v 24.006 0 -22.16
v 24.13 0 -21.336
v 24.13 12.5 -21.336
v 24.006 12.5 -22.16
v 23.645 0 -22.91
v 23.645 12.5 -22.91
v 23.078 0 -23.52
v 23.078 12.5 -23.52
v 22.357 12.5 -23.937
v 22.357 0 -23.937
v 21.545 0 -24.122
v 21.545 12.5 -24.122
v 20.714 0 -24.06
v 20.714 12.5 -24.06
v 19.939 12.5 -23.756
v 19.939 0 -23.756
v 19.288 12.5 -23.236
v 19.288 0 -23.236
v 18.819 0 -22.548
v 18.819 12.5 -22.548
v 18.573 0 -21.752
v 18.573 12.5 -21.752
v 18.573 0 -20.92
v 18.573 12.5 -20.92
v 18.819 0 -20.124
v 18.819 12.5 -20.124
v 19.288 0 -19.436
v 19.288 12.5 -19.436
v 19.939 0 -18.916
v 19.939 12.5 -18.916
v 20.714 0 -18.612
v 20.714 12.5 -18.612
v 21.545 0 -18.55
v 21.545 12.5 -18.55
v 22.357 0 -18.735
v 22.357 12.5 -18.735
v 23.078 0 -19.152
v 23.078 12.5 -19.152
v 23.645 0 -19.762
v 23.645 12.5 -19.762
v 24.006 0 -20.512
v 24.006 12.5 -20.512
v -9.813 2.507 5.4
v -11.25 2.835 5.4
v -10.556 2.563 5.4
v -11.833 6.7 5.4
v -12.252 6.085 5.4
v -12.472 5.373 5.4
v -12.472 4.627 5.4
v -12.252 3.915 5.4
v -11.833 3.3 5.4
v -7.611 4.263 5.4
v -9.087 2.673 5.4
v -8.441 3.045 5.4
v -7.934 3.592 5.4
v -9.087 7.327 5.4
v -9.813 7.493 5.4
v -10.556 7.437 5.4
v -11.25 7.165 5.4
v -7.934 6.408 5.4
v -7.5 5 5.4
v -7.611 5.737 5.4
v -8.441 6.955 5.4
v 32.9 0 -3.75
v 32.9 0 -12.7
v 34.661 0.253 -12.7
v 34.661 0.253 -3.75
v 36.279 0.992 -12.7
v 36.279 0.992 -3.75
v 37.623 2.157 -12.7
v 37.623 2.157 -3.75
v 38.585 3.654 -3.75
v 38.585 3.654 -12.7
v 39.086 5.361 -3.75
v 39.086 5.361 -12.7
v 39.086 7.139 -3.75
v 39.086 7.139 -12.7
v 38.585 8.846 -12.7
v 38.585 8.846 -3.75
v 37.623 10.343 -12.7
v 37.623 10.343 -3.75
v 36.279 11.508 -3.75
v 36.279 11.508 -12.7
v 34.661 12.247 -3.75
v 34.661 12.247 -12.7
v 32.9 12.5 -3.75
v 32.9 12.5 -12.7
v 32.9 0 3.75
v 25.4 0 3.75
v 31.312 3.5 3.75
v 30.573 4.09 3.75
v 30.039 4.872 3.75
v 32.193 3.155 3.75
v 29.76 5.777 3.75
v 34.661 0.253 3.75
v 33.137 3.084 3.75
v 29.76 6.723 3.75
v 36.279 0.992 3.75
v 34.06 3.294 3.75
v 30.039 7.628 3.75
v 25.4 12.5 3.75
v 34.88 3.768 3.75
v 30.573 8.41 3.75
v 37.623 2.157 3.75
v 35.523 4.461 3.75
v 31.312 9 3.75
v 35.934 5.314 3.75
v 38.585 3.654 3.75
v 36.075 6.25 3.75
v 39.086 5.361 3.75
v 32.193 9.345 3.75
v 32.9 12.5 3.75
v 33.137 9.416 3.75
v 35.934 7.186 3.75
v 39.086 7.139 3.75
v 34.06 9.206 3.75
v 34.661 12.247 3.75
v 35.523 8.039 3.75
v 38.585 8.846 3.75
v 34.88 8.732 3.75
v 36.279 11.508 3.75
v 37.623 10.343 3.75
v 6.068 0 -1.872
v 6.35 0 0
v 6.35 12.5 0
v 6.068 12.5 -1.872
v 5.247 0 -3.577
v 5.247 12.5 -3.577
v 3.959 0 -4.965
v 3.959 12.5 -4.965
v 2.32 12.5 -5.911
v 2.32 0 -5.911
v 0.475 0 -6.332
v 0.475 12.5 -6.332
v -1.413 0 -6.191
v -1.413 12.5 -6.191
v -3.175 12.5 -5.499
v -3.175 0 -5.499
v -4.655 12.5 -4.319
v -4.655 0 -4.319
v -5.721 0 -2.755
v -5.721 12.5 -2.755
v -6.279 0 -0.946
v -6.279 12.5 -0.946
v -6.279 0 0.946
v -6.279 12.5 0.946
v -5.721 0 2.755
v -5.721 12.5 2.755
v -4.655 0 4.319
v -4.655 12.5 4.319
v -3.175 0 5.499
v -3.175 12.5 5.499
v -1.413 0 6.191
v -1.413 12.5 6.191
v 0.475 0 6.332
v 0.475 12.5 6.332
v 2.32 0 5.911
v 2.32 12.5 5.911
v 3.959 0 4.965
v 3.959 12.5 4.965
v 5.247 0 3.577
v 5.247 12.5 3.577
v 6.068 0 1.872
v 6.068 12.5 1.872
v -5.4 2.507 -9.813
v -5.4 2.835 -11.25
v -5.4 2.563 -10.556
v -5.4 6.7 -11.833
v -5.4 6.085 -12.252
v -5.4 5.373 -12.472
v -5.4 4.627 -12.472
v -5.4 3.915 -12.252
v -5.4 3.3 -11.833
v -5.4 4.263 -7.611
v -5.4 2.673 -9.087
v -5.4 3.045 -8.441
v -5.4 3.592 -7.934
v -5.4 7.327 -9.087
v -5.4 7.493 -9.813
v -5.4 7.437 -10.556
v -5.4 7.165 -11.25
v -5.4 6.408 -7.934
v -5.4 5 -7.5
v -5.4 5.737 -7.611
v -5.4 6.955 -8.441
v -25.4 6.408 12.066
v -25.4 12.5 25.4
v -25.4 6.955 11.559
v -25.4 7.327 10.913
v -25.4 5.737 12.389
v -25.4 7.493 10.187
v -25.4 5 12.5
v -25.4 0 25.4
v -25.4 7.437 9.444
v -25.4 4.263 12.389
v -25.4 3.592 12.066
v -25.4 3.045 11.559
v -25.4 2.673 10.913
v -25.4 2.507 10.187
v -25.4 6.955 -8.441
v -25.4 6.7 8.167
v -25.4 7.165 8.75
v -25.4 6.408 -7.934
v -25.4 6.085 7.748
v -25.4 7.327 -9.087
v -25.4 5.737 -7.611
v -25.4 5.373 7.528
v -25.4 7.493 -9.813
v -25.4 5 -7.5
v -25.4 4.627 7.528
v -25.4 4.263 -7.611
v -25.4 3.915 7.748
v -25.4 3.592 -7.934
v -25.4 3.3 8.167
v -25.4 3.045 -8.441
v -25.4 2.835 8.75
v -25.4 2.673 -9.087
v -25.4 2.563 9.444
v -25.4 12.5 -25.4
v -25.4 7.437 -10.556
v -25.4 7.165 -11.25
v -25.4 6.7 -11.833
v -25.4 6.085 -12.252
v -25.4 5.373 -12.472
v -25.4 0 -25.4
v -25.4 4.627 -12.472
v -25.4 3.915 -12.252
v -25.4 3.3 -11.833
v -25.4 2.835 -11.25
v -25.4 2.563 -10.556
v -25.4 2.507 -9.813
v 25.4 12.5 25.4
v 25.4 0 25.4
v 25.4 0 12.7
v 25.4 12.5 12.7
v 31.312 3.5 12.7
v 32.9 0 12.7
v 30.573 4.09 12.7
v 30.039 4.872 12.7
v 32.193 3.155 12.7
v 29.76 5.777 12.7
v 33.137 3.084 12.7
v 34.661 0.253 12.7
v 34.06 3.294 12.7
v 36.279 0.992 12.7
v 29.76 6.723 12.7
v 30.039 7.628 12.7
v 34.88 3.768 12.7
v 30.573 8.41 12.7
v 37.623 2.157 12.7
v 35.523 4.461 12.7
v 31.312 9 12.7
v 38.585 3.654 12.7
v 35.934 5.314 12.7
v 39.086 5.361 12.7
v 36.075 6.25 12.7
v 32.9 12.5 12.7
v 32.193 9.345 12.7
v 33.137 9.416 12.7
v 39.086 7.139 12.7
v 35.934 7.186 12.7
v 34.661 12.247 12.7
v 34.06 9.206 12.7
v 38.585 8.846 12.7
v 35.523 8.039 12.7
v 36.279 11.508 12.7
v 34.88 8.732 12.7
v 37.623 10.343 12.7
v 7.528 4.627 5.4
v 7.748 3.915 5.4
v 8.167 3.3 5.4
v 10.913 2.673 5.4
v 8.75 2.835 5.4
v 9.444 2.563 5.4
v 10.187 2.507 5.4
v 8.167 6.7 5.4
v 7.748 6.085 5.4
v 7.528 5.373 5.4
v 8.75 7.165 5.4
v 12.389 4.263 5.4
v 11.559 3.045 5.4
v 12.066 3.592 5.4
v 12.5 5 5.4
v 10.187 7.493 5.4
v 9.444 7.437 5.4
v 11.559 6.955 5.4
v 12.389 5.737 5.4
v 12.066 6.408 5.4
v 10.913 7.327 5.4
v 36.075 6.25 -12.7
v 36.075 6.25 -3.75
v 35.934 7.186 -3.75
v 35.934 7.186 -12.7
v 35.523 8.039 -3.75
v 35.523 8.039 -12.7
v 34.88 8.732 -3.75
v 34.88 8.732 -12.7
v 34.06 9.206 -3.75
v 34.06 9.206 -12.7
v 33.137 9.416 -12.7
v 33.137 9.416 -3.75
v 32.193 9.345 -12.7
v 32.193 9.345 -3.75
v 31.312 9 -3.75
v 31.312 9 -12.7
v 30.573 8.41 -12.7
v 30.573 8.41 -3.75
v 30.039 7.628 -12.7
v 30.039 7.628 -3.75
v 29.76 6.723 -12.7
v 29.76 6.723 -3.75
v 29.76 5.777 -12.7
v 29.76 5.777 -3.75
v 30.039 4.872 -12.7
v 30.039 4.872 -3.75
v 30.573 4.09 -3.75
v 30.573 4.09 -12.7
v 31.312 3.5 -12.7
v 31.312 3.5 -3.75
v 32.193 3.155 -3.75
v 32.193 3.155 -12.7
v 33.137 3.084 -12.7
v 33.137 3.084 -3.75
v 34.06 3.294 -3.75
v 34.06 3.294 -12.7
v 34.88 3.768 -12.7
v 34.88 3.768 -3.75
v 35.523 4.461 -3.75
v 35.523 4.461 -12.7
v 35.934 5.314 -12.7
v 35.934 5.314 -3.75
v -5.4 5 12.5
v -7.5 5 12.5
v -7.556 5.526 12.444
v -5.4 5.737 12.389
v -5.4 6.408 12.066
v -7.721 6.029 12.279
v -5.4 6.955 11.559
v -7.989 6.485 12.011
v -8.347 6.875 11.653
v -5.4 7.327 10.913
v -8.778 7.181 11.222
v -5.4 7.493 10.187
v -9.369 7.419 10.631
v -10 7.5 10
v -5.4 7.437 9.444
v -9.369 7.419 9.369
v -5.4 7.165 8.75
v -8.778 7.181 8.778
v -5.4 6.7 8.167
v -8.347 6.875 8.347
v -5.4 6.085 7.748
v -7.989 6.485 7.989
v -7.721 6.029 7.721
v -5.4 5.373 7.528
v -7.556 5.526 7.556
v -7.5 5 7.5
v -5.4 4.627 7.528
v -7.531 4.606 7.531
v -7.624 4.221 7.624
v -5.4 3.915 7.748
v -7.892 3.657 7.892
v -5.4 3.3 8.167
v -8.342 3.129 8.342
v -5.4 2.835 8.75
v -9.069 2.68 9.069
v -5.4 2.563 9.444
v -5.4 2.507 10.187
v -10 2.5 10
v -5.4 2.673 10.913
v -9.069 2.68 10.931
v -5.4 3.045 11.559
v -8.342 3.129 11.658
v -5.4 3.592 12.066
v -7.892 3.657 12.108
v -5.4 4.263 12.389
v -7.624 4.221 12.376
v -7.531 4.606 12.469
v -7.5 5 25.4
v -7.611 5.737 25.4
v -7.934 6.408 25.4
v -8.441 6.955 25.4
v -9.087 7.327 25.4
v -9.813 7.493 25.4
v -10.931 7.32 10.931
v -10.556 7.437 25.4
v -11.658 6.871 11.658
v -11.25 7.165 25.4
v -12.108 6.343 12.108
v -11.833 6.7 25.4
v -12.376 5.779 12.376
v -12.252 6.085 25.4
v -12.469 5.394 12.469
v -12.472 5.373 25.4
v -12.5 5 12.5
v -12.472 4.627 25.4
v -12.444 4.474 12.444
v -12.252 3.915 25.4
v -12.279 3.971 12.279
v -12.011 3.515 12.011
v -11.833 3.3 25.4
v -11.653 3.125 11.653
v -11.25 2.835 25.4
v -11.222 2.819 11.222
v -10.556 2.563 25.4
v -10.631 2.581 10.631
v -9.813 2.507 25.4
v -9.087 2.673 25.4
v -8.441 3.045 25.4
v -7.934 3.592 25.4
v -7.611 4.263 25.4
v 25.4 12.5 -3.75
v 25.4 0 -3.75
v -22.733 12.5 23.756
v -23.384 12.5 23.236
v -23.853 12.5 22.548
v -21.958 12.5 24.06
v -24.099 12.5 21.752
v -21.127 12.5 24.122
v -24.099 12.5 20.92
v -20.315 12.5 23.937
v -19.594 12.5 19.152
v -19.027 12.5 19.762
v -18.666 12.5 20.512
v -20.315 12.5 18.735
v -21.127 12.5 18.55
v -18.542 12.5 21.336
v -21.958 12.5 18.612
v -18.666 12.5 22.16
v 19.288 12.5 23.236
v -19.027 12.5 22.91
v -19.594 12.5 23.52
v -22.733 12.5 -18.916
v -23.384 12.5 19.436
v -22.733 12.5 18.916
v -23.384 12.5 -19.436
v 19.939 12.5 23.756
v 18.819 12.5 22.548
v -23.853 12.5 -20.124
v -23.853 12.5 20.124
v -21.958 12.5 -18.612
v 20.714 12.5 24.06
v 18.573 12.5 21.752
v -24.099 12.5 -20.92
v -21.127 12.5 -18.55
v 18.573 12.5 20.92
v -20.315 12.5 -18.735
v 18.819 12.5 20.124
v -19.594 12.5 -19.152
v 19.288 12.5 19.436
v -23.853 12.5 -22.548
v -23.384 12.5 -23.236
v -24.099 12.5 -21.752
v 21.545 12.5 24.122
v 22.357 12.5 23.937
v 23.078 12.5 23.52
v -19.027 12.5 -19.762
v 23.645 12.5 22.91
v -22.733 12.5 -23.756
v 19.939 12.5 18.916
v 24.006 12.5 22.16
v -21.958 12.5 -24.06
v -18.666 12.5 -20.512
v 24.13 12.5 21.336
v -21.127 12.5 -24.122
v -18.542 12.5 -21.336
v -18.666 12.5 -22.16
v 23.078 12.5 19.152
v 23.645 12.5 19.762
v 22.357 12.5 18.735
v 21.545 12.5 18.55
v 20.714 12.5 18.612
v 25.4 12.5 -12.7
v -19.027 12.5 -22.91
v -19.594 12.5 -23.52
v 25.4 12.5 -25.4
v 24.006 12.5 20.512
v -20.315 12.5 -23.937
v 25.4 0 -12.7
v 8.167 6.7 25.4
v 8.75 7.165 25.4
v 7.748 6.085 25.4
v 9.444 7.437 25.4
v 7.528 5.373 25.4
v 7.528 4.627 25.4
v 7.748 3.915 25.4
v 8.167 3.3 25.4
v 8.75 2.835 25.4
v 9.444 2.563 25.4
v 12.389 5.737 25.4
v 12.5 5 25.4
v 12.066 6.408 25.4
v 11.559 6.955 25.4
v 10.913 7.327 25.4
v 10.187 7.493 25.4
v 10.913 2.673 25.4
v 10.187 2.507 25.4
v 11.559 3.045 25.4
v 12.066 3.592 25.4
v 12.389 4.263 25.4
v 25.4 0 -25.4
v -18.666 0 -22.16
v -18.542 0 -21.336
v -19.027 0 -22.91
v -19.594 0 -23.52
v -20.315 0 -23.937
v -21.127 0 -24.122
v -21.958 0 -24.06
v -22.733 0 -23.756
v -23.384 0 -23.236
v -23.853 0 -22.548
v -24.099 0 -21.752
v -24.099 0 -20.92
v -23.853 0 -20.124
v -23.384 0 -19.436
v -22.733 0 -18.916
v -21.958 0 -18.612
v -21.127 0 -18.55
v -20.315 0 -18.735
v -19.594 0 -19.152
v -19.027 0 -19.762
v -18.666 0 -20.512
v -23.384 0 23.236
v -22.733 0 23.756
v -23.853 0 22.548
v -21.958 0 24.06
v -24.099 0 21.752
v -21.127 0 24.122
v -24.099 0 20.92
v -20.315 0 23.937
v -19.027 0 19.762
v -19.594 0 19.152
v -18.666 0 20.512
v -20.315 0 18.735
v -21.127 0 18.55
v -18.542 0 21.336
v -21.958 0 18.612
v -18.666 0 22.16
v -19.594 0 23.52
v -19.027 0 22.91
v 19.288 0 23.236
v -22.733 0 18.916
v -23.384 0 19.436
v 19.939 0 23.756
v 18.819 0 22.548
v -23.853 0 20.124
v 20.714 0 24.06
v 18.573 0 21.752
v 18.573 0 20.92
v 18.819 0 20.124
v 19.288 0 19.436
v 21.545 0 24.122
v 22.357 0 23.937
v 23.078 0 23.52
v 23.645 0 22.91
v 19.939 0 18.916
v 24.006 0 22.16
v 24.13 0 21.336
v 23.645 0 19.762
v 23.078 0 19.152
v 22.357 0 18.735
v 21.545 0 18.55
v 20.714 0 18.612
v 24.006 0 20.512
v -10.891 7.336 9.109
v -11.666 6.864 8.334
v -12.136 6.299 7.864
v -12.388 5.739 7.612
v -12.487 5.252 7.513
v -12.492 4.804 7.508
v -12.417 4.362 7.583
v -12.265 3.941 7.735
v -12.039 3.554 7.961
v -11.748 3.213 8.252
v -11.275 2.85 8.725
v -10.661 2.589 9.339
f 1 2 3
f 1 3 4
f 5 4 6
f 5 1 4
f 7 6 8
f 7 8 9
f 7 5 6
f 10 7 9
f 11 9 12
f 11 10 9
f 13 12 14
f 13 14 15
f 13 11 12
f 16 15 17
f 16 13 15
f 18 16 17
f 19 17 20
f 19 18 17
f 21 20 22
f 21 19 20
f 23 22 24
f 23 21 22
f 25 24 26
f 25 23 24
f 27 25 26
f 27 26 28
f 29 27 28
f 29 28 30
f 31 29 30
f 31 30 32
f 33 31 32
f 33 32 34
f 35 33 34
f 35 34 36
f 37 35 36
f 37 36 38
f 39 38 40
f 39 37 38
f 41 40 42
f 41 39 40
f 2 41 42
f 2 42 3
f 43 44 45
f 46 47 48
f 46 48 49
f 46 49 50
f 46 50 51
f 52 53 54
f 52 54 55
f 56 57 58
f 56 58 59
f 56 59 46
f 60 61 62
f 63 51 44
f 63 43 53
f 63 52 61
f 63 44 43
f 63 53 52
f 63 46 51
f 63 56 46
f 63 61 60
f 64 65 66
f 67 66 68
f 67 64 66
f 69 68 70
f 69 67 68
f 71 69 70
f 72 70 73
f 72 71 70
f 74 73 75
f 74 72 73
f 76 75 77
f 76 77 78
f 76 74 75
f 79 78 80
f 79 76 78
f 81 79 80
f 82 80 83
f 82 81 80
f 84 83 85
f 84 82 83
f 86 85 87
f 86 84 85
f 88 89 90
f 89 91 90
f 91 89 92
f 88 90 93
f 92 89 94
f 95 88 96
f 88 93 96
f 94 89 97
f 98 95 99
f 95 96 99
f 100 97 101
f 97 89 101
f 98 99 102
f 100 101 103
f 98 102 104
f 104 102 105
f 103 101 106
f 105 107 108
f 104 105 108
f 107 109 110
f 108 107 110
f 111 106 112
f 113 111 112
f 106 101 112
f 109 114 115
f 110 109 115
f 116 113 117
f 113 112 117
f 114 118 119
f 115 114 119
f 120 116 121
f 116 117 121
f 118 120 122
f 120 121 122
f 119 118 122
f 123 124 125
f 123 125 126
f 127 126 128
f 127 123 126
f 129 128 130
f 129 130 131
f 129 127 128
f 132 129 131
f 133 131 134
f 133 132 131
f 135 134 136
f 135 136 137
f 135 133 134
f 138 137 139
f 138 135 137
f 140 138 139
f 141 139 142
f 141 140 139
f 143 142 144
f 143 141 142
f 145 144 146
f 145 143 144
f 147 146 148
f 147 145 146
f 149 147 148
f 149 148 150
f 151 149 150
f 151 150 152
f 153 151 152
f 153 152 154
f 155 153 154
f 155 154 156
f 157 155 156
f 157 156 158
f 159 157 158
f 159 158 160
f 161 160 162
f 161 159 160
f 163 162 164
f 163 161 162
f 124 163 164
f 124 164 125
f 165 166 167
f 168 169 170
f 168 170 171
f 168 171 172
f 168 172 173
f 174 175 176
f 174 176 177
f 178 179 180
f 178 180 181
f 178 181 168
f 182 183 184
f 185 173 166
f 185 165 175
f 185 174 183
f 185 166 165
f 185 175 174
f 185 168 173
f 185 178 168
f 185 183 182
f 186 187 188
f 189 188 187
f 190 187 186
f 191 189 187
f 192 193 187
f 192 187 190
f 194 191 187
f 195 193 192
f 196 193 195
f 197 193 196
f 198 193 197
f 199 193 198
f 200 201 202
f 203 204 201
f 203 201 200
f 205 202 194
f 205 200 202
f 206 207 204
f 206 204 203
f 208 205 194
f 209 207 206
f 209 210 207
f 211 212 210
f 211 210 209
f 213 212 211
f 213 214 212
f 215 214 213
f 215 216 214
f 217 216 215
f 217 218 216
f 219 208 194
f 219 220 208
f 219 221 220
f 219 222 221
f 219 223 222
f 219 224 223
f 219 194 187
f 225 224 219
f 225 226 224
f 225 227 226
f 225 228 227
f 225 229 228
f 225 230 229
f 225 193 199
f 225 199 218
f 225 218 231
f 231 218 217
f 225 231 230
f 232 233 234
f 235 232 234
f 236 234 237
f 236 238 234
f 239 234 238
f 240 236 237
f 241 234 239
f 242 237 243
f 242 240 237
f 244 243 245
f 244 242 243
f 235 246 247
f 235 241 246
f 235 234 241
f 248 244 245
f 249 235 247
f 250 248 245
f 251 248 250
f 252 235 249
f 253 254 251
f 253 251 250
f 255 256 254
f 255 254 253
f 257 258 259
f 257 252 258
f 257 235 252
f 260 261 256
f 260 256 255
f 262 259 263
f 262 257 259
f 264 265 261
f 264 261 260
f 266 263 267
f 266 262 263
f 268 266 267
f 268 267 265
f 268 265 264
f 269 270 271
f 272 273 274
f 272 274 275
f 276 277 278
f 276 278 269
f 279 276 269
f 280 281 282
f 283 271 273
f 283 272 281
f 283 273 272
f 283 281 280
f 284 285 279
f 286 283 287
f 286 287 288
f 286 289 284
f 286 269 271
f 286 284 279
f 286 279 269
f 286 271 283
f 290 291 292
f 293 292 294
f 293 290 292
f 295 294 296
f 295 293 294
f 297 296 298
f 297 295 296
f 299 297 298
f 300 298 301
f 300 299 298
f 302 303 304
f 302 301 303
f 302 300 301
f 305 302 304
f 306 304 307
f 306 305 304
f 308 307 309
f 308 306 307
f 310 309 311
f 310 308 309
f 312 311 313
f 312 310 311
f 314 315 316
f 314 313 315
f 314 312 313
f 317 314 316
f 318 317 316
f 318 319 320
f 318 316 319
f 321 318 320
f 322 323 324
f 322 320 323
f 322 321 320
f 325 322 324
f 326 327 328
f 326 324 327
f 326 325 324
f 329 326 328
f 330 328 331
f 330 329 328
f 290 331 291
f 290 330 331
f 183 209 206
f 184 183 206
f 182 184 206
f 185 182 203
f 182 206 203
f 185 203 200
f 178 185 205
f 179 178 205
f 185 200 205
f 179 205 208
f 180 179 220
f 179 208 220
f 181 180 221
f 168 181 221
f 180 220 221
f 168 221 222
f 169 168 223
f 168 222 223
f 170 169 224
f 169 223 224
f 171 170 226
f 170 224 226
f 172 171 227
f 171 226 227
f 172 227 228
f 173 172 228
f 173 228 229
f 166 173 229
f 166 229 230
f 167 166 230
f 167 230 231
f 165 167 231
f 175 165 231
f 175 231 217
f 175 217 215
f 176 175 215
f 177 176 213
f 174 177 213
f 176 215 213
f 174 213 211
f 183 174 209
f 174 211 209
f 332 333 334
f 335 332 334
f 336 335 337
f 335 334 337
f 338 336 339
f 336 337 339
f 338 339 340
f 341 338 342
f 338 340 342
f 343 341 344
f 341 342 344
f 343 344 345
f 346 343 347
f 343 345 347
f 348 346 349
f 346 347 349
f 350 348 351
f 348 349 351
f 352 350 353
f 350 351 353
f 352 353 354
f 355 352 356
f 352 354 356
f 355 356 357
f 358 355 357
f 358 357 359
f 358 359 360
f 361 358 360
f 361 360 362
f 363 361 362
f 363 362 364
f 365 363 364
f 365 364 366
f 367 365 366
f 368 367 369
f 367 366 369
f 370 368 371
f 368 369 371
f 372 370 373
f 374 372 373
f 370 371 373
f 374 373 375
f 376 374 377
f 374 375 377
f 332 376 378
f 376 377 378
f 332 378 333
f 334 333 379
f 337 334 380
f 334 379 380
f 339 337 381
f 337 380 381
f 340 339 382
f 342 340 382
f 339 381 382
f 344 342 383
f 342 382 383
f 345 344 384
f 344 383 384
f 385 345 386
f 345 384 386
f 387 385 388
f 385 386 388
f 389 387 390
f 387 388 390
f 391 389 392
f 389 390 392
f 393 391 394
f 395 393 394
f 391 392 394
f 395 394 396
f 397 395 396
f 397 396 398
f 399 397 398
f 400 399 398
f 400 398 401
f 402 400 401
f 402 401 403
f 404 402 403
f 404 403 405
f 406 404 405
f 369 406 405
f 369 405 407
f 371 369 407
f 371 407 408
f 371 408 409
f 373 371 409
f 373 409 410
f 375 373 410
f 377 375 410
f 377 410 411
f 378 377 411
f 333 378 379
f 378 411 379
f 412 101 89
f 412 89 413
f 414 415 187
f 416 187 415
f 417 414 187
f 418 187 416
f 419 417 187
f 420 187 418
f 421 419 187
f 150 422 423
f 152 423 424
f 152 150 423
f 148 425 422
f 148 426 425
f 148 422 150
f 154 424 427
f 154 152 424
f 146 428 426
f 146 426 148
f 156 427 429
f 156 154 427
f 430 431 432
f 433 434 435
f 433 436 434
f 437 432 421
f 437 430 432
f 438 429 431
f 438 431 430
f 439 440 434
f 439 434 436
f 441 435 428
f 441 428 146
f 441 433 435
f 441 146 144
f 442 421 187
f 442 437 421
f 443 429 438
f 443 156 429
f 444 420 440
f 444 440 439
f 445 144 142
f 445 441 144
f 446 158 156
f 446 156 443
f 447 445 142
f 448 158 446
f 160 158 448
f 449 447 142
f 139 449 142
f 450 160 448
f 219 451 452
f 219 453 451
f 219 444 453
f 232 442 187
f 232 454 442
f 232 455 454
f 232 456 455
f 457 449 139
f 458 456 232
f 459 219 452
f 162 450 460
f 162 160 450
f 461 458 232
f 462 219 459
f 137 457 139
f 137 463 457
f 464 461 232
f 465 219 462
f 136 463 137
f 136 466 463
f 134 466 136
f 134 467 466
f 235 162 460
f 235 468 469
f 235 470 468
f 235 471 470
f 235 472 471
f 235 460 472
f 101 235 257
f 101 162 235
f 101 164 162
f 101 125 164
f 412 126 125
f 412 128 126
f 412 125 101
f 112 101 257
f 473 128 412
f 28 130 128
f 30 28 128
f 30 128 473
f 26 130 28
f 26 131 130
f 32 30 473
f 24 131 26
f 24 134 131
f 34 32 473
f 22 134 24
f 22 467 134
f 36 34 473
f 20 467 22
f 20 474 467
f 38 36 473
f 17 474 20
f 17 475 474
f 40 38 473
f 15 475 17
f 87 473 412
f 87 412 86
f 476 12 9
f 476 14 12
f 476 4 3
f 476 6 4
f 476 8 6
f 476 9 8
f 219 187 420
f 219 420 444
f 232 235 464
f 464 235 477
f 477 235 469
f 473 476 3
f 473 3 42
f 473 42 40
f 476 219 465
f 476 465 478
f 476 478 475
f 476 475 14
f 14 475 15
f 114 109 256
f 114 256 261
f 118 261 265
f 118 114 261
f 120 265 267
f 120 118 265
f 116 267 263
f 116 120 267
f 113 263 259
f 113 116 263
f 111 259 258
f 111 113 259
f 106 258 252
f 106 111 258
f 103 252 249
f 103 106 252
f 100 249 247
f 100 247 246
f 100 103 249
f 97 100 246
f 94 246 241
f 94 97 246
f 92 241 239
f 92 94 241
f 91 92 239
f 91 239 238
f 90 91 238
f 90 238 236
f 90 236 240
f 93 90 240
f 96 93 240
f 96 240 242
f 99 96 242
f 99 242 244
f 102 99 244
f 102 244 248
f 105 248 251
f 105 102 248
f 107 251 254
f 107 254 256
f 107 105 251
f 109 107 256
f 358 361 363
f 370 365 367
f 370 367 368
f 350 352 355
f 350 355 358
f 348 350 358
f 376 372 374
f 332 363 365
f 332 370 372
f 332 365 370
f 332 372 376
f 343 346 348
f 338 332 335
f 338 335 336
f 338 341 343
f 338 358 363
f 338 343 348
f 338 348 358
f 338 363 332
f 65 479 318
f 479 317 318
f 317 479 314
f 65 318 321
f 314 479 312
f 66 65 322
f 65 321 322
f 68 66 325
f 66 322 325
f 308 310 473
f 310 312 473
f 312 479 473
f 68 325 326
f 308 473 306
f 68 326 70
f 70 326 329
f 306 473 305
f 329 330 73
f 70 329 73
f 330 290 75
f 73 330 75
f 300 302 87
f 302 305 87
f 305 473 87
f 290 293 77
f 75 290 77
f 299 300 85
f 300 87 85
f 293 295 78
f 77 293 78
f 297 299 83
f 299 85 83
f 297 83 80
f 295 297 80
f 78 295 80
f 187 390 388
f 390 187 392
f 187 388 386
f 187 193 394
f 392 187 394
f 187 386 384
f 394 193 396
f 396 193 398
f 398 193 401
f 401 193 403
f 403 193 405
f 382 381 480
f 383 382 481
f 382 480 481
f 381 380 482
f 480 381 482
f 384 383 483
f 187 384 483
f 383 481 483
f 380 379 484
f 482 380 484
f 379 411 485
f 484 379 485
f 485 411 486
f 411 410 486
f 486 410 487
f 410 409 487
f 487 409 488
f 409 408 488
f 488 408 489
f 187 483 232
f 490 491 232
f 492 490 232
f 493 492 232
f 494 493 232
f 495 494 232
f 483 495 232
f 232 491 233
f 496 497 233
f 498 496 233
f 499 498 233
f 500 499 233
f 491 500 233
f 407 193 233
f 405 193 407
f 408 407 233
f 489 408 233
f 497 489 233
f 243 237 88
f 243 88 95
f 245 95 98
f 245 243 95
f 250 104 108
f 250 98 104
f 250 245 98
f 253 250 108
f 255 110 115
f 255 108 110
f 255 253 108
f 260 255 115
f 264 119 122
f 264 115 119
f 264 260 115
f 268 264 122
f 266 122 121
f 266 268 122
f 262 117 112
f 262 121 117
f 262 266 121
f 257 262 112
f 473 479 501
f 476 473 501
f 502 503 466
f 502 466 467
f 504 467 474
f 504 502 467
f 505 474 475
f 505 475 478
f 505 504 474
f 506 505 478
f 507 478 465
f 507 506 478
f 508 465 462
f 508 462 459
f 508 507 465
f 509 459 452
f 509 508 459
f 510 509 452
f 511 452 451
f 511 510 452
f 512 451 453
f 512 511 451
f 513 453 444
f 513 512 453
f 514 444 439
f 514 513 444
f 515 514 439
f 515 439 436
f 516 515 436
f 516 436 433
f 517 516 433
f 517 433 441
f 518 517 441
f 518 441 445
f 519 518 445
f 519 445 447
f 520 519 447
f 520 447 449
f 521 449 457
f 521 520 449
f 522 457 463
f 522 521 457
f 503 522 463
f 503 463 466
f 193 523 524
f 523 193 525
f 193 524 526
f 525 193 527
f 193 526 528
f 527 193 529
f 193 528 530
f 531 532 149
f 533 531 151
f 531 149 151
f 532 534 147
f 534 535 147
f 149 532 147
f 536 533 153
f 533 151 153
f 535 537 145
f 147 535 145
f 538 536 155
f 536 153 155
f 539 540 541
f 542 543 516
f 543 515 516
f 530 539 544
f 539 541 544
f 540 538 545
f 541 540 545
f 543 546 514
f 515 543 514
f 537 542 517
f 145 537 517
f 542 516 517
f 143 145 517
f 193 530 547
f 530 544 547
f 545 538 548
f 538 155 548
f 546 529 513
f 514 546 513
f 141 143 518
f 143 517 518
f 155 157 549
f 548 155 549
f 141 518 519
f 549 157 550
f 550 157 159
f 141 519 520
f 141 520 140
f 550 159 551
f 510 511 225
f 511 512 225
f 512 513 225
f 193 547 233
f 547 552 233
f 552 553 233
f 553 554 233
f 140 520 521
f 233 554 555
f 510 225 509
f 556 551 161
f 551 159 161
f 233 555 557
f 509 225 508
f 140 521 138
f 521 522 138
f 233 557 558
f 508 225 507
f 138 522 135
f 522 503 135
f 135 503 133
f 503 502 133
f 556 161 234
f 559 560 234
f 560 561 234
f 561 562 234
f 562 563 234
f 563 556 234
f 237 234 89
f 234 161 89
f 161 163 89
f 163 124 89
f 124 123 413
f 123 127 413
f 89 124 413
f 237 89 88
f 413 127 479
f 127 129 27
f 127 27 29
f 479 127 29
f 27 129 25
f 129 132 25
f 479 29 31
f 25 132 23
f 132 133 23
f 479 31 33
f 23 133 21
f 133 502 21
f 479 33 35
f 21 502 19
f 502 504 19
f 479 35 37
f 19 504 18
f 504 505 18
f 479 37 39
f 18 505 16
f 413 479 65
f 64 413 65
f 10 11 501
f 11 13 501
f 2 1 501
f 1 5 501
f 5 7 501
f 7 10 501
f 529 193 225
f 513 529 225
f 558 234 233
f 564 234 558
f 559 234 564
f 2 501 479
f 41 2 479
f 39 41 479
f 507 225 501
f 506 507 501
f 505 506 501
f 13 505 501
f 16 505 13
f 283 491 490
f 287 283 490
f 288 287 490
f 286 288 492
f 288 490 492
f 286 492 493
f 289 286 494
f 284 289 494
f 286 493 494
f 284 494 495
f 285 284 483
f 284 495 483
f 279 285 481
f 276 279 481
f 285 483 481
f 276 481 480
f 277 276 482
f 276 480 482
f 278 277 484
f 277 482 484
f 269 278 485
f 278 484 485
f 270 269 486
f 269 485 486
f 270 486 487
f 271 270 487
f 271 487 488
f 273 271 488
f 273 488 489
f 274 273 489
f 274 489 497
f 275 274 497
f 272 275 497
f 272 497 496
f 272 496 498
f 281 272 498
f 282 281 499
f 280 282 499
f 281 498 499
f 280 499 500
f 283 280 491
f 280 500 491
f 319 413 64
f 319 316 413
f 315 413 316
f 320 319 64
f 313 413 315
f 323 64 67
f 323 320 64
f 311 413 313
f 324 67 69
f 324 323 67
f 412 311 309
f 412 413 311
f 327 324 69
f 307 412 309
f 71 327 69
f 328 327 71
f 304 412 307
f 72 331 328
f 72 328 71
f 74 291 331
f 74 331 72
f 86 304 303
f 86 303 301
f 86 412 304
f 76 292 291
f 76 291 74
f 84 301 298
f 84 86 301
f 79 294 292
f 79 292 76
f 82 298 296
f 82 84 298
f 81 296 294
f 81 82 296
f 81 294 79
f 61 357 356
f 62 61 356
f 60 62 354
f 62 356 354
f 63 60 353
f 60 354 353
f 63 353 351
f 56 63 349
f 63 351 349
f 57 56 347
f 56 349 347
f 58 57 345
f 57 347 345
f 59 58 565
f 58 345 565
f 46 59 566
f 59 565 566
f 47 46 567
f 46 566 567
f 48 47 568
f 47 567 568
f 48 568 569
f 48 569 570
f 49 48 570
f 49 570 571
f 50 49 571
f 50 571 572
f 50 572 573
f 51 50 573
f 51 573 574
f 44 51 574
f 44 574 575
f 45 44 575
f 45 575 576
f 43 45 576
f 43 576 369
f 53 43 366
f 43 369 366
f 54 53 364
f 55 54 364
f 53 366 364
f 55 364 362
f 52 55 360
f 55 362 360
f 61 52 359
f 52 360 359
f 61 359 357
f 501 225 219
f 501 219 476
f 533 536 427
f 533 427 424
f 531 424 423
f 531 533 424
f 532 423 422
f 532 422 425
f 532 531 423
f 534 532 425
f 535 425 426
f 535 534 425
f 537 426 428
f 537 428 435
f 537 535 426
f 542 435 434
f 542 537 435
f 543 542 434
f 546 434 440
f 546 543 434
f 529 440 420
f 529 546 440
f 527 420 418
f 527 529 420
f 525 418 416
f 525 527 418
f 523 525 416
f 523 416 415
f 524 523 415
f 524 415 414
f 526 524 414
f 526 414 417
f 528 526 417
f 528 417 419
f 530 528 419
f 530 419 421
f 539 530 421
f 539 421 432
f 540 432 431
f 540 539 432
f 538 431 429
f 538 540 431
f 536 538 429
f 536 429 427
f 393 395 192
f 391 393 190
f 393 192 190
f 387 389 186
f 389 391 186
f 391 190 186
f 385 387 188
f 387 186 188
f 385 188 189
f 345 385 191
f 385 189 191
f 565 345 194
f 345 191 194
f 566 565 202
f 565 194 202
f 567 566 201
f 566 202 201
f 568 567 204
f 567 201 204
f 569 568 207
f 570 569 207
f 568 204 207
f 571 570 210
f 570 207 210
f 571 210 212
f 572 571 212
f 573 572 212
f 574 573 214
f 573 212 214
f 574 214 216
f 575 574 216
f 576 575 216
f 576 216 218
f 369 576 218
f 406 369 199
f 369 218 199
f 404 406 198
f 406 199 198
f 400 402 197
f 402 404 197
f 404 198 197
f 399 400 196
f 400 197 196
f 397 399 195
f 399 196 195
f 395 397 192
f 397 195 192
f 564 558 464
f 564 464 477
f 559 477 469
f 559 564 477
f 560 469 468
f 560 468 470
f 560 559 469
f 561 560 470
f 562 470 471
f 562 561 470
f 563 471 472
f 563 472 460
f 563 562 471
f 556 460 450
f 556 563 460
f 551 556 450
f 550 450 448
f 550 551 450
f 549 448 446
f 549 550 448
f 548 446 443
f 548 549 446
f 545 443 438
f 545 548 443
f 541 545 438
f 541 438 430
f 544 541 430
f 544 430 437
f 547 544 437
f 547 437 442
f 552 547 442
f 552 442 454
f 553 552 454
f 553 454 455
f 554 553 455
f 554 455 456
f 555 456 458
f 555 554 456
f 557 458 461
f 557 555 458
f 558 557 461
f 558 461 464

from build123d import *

# Parameters (mm, degrees)
SKETCH1_W           = 50.8
SKETCH1_H           = 50.8
SKETCH1_R           = 2.794
SKETCH1_R_2         = 6.35
BOSS_EXTRUDE1_DEPTH = 12.5
SKETCH4_R           = 3.175
BOSS_EXTRUDE2_DEPTH = 12.7
SKETCH5_W           = 13.75
SKETCH5_H           = 7.5
CUT_EXTRUDE2_DEPTH  = 13.5
SKETCH14_R          = 2.5
CUT_EXTRUDE7_DEPTH  = 20
SKETCH15_R          = 2.5
CUT_EXTRUDE8_DEPTH  = 20


with BuildPart() as part:
    # Sketch1 → Boss-Extrude1 (new body)
    with BuildSketch(Plane(origin=(0, 0, 0), x_dir=(1, 0, 0), z_dir=(0, 1, 0))):
        Rectangle(SKETCH1_W, SKETCH1_H)
        with Locations((-21.336, -21.336)):
            Circle(SKETCH1_R, mode=Mode.SUBTRACT)
        with Locations((21.336, -21.336)):
            Circle(SKETCH1_R, mode=Mode.SUBTRACT)
        with Locations((21.336, 21.336)):
            Circle(SKETCH1_R, mode=Mode.SUBTRACT)
        with Locations((-21.336, 21.336)):
            Circle(SKETCH1_R, mode=Mode.SUBTRACT)
        Circle(SKETCH1_R_2, mode=Mode.SUBTRACT)
    extrude(amount=BOSS_EXTRUDE1_DEPTH)

    # Sketch4 → Boss-Extrude2 (add, symmetric)
    with BuildSketch(Plane.XY):
        with BuildLine():
            Line((25.4, 0), (32.9, 0))
            ThreePointArc((32.9, 0), (39.15, 6.25), (32.9, 12.5))
            Line((32.9, 12.5), (25.4, 12.5))
            Line((25.4, 12.5), (25.4, 0))
        make_face()
        with Locations((32.9, 6.25)):
            Circle(SKETCH4_R, mode=Mode.SUBTRACT)
    extrude(amount=BOSS_EXTRUDE2_DEPTH, both=True)

    # Sketch5 → Cut-Extrude2 (cut, through all)
    with BuildSketch(Plane(origin=(0, 12.5, 0), x_dir=(1, 0, 0), z_dir=(0, 1, 0))):
        with Locations((32.275, 0)):
            Rectangle(SKETCH5_W, SKETCH5_H)
    extrude(amount=-CUT_EXTRUDE2_DEPTH, mode=Mode.SUBTRACT)

    # Sketch14 → Cut-Extrude7 (cut)
    with BuildSketch(Plane.XY.offset(25.4)):
        with Locations((-10, 5)):
            Circle(SKETCH14_R)
        with Locations((10, 5)):
            Circle(SKETCH14_R)
    extrude(amount=-CUT_EXTRUDE7_DEPTH, mode=Mode.SUBTRACT)

    # Sketch15 → Cut-Extrude8 (cut)
    with BuildSketch(Plane.ZY.offset(25.4)):
        with Locations((-10, 5)):
            Circle(SKETCH15_R)
        with Locations((10, 5)):
            Circle(SKETCH15_R)
    extrude(amount=-CUT_EXTRUDE8_DEPTH, mode=Mode.SUBTRACT)


solid = part.part
